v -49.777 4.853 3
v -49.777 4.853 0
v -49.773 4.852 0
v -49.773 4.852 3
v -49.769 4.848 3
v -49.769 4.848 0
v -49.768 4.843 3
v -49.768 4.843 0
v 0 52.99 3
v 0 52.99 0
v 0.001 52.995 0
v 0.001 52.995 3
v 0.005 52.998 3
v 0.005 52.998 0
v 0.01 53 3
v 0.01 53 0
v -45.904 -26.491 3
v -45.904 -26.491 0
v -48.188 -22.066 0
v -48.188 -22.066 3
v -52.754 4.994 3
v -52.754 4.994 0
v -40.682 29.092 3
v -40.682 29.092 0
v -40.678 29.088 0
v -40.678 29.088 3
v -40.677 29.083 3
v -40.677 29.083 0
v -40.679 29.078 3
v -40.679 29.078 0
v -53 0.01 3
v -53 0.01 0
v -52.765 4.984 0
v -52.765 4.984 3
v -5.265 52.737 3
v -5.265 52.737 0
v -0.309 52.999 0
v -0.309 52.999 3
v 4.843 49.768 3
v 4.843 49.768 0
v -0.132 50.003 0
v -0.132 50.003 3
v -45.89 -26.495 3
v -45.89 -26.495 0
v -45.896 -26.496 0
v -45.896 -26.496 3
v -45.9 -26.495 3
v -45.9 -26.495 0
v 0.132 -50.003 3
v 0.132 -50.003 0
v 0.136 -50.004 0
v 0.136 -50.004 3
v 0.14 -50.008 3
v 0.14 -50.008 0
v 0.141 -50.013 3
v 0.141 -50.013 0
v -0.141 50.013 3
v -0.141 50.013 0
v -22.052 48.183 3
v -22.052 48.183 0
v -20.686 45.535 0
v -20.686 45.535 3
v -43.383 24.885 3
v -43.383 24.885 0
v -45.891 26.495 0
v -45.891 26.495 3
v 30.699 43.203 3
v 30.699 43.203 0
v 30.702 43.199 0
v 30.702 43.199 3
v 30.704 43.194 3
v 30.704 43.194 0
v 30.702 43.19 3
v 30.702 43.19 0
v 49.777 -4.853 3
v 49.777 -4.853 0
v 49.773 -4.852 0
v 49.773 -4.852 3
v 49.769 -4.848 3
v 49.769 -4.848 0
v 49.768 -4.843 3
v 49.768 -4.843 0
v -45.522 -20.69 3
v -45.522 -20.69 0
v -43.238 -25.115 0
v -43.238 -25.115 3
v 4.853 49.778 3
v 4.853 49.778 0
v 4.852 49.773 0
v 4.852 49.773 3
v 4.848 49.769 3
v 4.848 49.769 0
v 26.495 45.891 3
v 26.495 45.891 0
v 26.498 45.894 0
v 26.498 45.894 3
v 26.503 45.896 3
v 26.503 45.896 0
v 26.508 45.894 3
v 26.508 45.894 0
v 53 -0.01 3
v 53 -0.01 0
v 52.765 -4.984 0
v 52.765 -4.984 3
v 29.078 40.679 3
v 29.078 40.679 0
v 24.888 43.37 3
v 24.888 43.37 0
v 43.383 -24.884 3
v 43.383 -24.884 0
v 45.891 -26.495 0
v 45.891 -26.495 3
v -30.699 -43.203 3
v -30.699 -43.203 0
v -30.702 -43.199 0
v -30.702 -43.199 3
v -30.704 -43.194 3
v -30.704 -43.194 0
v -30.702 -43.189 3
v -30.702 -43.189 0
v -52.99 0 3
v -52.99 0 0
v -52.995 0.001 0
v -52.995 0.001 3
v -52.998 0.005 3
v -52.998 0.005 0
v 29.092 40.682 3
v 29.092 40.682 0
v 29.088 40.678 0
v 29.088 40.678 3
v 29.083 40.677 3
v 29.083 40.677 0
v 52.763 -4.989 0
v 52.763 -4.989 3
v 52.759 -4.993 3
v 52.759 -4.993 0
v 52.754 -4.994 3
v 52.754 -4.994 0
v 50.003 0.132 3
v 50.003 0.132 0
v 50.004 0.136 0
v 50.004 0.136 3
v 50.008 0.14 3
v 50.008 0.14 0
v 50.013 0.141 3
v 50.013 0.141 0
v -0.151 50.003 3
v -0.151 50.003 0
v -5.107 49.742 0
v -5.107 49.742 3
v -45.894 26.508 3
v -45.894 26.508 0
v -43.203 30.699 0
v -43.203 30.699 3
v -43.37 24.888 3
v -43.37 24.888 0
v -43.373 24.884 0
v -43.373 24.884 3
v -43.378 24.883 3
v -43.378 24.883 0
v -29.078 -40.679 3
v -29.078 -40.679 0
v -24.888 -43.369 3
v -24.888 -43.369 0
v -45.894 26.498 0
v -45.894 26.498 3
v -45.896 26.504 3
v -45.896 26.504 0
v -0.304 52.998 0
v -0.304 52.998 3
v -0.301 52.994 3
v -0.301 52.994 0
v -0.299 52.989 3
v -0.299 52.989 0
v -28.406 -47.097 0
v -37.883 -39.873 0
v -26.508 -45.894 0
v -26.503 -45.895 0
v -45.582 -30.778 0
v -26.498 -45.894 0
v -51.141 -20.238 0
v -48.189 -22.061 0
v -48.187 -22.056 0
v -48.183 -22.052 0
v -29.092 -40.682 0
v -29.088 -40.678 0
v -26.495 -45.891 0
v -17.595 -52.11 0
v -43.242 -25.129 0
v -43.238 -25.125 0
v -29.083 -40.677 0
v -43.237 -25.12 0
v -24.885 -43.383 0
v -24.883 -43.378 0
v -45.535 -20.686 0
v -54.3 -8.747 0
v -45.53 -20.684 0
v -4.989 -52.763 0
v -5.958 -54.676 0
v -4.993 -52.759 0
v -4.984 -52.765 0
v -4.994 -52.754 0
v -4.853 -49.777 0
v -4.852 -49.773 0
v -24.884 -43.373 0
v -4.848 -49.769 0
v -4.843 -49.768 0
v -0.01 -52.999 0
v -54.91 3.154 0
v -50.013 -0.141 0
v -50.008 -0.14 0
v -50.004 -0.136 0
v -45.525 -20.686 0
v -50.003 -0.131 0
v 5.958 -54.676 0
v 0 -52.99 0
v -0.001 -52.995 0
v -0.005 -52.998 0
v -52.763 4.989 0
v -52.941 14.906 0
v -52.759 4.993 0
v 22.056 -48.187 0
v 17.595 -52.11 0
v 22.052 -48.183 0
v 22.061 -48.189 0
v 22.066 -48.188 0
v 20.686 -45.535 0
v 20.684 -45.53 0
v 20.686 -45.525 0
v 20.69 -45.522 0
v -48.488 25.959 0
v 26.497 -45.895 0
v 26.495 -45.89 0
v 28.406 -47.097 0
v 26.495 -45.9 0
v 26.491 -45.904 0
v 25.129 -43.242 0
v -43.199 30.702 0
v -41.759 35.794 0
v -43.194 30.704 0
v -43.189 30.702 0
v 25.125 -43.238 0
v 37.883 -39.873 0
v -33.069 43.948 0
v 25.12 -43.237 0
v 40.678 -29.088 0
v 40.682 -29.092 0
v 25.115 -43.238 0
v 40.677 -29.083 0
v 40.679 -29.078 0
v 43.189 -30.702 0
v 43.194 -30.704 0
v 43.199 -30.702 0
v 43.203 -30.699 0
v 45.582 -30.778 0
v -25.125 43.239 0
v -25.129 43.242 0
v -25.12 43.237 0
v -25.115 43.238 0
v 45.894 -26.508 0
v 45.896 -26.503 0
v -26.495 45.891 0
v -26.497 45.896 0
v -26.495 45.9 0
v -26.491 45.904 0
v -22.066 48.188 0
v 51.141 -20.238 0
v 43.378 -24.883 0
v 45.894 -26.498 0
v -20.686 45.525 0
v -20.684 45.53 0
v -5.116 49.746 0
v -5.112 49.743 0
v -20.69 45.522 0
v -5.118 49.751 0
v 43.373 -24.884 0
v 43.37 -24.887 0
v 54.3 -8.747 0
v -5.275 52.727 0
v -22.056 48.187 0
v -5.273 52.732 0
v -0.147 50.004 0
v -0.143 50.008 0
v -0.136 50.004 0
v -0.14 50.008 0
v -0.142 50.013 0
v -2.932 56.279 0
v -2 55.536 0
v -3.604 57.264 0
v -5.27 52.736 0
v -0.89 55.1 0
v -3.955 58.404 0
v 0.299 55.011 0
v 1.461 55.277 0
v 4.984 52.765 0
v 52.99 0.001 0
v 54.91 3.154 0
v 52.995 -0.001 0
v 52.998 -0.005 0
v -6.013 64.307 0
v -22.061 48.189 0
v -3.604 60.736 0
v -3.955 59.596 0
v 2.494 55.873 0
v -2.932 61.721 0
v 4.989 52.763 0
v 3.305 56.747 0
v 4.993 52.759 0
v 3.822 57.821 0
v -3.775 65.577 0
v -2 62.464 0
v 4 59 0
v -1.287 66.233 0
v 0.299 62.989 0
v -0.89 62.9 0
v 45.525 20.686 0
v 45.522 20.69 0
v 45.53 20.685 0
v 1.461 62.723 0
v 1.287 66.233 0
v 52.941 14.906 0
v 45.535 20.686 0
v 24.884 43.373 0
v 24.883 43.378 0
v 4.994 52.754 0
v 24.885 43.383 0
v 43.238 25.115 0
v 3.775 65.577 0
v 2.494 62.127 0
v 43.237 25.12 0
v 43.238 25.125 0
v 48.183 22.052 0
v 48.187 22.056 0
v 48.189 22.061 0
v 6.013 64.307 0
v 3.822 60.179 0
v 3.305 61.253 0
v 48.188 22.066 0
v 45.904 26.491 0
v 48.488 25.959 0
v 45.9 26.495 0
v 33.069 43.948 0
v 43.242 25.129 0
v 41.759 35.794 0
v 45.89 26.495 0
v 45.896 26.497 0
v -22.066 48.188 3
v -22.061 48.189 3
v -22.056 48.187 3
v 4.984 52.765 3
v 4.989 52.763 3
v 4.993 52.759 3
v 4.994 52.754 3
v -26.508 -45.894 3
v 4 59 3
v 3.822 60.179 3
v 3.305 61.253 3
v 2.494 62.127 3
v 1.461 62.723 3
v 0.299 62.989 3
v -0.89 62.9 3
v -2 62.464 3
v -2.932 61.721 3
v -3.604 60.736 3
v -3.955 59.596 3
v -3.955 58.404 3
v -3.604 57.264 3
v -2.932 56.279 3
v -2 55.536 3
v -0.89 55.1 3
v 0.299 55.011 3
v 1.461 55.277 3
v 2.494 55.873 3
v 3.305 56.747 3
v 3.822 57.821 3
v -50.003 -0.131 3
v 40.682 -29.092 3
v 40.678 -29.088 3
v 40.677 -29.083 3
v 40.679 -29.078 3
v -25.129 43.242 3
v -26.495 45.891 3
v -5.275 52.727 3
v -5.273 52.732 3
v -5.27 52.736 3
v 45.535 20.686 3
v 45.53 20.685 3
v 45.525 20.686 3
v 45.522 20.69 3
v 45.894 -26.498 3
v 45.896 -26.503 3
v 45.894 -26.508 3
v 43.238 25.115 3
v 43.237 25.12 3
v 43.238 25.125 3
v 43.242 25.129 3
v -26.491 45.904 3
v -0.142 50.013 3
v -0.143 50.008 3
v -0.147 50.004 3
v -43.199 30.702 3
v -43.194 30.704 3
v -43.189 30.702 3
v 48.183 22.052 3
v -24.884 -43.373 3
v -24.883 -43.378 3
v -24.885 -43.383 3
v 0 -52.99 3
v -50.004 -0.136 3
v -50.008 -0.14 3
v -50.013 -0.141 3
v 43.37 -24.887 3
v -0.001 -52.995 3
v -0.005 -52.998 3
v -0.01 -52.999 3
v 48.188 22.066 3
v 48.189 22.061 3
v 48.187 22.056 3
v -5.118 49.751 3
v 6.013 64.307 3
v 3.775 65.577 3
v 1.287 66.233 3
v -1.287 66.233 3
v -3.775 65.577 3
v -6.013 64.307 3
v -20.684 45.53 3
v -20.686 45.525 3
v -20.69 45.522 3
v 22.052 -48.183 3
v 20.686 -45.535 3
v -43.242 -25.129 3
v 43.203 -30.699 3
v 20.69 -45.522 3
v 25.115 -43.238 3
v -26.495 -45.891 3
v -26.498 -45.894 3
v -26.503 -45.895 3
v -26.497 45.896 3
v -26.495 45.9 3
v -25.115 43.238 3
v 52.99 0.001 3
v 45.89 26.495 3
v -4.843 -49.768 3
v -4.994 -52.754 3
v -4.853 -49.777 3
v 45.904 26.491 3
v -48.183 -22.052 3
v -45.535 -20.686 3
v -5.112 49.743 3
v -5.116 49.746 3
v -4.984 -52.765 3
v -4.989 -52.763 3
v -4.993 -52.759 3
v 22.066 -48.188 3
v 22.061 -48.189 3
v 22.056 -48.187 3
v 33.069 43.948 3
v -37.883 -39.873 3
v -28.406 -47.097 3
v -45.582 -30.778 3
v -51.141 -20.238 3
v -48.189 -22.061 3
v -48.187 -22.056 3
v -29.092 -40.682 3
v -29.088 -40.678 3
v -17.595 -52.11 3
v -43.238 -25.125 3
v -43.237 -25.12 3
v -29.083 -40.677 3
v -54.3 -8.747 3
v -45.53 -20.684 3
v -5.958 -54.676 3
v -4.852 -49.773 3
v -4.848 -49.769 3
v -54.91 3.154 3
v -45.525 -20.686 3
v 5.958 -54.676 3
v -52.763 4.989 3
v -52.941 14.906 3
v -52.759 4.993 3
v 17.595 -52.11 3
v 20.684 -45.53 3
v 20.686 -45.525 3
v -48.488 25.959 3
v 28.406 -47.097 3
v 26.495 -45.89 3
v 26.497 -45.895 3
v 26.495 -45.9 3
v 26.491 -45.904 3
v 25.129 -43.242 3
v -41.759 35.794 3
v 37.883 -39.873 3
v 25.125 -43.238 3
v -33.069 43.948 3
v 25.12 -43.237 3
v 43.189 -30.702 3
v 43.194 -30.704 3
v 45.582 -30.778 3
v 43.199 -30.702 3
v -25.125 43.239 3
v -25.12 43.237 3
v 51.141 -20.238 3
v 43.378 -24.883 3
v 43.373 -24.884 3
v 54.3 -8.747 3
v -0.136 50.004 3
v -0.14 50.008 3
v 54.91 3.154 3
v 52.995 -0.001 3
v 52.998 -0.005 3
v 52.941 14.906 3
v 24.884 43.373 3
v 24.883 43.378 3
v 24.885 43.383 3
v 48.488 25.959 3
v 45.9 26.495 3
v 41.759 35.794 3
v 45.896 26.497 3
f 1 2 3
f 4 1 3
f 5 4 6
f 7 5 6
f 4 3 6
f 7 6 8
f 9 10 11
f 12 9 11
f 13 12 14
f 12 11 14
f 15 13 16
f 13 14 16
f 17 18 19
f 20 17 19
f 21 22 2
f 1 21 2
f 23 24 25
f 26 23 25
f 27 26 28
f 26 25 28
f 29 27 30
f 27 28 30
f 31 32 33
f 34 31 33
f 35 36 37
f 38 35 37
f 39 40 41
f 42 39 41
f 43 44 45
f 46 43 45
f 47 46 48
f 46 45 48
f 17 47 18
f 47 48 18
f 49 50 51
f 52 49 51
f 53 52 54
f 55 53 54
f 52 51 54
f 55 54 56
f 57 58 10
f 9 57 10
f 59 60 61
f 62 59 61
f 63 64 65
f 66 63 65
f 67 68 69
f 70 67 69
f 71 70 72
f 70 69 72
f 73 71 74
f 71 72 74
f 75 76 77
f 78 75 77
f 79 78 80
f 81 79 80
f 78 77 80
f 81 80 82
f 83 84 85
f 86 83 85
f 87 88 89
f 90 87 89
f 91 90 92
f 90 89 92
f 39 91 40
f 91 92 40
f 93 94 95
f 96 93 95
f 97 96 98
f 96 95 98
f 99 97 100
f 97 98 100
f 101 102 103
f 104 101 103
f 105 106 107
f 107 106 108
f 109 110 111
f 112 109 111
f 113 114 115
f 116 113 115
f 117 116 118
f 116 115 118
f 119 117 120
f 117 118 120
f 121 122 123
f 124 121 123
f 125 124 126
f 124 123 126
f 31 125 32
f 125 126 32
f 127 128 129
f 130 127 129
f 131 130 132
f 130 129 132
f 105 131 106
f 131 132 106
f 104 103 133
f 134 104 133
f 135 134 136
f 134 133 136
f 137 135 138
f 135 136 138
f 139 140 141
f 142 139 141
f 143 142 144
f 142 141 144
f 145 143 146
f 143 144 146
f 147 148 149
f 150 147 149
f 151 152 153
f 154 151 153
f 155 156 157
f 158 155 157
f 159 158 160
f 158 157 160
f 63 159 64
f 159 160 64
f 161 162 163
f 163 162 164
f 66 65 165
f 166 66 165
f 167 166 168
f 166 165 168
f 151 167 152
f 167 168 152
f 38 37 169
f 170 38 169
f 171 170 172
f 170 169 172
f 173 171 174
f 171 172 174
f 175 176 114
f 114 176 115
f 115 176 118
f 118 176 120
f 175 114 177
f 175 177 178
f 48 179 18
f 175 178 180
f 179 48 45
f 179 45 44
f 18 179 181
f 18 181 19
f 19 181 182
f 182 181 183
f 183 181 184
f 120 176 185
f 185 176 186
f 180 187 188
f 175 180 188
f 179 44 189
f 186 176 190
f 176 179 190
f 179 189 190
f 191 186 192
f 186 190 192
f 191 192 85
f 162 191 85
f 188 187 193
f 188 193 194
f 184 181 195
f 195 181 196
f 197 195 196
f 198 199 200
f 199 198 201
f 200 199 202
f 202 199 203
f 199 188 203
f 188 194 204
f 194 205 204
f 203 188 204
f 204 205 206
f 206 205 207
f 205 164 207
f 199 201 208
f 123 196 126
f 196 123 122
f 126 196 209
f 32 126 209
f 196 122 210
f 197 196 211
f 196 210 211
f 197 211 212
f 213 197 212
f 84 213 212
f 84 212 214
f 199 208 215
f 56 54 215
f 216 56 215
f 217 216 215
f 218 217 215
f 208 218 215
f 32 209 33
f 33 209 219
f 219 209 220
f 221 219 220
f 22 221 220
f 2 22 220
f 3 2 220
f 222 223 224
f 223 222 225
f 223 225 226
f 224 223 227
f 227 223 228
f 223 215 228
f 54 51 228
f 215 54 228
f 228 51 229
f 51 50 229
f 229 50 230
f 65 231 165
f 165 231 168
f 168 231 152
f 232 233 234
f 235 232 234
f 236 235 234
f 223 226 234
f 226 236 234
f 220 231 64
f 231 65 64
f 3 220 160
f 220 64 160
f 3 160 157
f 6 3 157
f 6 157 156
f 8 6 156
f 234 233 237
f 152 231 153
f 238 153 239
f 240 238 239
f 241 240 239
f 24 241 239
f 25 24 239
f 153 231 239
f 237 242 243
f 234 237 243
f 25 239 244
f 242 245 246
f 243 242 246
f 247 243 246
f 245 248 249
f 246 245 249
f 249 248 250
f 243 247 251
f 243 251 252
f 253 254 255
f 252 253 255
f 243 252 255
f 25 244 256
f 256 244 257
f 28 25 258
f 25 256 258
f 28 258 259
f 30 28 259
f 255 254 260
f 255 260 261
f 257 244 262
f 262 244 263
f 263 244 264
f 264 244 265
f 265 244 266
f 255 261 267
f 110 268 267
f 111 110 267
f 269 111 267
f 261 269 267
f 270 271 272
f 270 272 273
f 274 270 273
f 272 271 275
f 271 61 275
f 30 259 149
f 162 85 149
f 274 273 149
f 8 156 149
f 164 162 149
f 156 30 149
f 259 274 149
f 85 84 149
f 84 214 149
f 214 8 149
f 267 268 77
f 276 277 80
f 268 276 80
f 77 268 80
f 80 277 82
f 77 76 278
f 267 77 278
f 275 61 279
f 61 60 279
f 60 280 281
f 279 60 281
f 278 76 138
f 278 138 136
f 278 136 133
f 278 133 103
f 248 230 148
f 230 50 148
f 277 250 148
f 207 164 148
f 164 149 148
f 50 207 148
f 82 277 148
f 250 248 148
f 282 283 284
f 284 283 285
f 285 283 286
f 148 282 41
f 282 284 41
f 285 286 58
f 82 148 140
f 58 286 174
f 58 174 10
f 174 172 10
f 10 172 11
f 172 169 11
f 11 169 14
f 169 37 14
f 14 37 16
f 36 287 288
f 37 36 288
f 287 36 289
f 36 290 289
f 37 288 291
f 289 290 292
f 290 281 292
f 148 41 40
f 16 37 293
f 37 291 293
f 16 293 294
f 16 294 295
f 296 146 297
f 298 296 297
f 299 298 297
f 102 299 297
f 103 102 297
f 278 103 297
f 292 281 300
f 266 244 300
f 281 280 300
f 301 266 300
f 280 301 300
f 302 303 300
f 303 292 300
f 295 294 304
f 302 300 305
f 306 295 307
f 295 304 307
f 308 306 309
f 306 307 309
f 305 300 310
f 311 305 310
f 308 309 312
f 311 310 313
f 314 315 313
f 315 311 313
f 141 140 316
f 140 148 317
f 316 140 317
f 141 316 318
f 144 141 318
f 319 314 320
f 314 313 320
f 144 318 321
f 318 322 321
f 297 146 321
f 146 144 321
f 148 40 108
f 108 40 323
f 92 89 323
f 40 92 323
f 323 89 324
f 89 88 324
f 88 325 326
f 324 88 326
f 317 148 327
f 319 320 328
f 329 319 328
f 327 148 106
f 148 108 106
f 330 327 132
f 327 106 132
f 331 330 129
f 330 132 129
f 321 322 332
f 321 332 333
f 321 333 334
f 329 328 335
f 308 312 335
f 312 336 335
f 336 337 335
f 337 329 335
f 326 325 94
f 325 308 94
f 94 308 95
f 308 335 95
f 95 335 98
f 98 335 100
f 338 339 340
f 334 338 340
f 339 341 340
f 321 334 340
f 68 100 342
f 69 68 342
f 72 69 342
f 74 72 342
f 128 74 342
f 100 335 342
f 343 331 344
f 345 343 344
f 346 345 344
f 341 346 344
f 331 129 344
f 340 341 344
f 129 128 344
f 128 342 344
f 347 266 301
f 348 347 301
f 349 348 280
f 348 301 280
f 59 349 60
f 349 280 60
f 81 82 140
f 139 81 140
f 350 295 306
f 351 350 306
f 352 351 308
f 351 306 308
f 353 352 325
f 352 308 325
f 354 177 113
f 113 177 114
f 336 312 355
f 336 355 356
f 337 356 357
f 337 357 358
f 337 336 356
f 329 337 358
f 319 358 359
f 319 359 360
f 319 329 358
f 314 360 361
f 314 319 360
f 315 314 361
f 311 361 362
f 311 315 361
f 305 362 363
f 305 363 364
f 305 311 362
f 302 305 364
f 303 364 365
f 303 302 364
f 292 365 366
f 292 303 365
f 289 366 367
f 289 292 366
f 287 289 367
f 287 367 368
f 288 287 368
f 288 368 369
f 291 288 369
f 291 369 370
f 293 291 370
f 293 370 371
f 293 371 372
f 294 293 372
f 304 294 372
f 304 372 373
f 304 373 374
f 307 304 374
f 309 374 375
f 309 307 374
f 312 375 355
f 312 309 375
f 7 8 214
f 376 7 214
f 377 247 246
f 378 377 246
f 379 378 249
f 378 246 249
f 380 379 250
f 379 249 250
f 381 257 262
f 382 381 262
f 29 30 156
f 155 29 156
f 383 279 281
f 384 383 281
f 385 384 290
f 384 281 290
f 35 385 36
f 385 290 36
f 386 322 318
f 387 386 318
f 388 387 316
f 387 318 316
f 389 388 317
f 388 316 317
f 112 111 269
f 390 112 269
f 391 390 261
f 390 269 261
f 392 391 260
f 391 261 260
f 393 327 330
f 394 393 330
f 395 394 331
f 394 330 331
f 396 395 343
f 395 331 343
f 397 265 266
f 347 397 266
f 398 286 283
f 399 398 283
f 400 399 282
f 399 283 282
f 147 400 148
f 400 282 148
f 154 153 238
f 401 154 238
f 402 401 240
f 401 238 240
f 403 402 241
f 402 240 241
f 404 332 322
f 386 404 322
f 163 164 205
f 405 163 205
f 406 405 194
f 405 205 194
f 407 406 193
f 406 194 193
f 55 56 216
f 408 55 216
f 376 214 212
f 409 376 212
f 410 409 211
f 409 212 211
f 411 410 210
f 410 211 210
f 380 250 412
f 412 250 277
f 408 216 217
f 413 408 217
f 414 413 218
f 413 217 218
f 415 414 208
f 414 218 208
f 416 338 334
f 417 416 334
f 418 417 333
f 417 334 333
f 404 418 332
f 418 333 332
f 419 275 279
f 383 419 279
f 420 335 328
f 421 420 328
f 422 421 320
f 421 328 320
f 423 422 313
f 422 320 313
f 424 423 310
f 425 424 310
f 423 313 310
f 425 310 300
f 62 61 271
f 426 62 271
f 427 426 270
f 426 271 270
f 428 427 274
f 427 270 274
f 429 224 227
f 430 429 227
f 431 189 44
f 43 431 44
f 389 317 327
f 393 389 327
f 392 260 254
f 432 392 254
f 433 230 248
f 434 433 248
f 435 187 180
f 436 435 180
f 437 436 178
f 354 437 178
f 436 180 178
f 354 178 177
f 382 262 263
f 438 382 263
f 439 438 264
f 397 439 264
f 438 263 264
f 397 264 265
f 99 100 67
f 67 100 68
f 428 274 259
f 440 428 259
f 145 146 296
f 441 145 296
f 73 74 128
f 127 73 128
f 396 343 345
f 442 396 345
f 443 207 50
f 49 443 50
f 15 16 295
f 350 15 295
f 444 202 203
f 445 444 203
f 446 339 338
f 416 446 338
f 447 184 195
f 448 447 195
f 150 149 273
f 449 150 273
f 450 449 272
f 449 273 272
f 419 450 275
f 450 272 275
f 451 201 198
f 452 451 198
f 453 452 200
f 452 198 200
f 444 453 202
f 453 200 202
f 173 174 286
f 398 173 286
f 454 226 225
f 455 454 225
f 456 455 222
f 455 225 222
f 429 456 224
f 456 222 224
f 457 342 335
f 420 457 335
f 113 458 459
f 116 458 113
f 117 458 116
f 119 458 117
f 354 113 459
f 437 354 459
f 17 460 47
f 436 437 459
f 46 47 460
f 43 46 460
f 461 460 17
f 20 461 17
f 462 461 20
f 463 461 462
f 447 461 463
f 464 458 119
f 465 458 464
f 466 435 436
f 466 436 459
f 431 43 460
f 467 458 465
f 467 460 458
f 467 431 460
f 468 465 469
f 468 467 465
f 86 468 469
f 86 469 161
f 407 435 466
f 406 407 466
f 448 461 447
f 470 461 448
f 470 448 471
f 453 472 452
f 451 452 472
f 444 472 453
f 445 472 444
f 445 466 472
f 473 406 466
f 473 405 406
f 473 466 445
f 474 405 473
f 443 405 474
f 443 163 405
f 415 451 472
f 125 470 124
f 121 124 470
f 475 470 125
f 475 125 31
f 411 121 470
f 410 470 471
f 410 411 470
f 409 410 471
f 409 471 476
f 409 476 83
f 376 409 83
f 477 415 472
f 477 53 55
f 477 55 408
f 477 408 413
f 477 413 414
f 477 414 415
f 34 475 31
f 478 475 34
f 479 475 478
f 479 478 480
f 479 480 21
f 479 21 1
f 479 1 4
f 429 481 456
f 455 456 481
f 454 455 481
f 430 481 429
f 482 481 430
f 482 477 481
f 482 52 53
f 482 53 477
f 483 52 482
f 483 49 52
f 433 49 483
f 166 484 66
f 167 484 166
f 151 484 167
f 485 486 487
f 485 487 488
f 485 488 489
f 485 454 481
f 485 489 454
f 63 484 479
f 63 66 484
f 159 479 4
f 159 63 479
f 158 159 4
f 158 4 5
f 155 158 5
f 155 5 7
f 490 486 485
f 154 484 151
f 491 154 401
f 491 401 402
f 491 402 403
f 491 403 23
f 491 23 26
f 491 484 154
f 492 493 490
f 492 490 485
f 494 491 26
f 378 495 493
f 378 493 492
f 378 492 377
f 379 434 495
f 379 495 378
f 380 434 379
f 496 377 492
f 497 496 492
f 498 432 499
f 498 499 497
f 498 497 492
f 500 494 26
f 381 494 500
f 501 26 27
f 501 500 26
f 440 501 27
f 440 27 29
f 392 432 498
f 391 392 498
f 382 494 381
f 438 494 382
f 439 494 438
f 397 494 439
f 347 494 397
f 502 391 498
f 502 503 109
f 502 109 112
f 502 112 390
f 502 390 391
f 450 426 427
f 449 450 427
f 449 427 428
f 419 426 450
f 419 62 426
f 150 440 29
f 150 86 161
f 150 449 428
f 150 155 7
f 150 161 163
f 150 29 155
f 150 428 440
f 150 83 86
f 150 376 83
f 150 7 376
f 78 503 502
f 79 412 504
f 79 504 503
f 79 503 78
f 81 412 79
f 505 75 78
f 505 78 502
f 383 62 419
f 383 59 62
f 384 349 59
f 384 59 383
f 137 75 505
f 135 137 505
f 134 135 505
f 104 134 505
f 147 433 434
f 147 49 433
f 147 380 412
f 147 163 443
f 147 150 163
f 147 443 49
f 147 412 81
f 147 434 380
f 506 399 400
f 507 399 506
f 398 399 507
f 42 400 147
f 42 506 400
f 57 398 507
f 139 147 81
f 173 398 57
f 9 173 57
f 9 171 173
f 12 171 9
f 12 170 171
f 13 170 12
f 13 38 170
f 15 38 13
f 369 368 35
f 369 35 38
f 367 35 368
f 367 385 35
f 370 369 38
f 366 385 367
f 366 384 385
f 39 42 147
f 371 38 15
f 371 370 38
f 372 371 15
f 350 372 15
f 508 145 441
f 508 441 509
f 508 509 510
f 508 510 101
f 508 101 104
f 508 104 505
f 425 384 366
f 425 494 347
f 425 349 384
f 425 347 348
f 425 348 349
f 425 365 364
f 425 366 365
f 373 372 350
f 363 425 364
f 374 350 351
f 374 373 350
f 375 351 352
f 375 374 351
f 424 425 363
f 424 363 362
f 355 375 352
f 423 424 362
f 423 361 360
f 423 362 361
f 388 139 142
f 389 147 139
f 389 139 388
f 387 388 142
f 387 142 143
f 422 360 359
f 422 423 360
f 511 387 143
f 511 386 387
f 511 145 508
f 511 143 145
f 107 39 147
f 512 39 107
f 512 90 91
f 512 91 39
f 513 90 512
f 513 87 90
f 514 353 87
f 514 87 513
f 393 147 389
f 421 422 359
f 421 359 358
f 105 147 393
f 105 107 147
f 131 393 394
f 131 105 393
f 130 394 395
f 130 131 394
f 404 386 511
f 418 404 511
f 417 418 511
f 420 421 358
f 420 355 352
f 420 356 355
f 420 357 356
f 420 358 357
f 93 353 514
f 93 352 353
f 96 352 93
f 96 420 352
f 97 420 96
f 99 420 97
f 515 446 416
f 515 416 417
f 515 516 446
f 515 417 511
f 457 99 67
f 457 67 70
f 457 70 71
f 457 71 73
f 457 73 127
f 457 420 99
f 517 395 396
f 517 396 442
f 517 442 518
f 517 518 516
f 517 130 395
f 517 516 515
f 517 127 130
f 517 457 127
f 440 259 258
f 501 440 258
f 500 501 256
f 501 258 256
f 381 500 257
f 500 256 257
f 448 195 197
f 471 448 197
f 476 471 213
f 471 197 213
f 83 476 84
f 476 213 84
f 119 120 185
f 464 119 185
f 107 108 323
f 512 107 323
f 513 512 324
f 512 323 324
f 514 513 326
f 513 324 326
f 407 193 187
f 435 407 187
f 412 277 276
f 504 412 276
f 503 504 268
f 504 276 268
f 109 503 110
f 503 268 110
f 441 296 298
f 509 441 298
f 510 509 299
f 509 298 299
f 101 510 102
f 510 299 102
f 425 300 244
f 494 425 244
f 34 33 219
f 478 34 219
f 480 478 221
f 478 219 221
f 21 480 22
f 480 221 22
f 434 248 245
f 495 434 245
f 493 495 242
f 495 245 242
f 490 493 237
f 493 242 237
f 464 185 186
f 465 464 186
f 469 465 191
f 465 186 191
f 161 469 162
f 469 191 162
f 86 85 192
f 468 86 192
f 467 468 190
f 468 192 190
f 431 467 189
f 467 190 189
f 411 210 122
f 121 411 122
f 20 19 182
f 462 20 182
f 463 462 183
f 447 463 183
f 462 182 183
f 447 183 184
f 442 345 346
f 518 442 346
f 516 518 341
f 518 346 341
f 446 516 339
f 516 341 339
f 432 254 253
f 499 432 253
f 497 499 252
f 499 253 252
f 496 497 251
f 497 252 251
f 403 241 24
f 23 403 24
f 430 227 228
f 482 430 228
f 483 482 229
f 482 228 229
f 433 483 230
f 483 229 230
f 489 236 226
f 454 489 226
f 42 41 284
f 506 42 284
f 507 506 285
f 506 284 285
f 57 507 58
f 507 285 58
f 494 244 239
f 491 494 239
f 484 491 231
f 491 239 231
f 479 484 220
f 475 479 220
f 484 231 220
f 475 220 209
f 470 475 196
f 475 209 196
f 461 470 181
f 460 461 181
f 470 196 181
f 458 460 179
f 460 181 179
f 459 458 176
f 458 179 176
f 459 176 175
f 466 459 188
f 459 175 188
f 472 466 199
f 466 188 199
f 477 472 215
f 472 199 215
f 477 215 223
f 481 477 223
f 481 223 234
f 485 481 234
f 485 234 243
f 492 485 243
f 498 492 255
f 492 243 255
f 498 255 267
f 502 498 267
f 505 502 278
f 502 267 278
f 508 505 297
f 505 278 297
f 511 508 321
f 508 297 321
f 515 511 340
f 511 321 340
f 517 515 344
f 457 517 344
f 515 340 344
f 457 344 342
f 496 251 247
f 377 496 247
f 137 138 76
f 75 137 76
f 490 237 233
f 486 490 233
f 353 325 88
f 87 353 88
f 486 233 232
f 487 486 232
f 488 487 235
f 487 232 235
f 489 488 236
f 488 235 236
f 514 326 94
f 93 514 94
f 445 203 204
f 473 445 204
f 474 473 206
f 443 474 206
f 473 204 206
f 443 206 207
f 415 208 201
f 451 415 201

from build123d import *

# Parameters (mm, degrees)
SKETCH1_R           = 4
BOSS_EXTRUDE2_DEPTH = 3


with BuildPart() as part:
    # Sketch1 → Boss-Extrude2 (new body)
    with BuildSketch(Plane.XY):
        with BuildLine():
            Line((-6.012571554, 64.307027075), (-33.069131887, 43.948066126))
            ThreePointArc((-33.069131887, 43.948066126), (2.07e-06, -55), (33.069128578, 43.948068616))
            Line((33.069128578, 43.948068616), (6.012566712, 64.307027528))
            ThreePointArc((6.012566712, 64.307027528), (-2.497e-06, 66.316469598), (-6.012571554, 64.307027075))
        make_face()
        with BuildLine():
            ThreePointArc((-30.698965133, -43.203238849), (-30.703332787, -43.196953768), (-30.701976961, -43.189421147))
            Line((-30.701976961, -43.189421147), (-29.091901743, -40.68182114))
            ThreePointArc((-29.091901743, -40.68182114), (-29.085616662, -40.677453486), (-29.078084041, -40.678809312))
            Line((-29.078084041, -40.678809312), (-24.88753101, -43.369471925))
            ThreePointArc((-24.88753101, -43.369471925), (-24.883163356, -43.375757006), (-24.884519182, -43.383289627))
            Line((-24.884519182, -43.383289627), (-26.4945944, -45.890889633))
            ThreePointArc((-26.4945944, -45.890889633), (-26.500879481, -45.895257287), (-26.508412102, -45.893901462))
            Line((-26.508412102, -45.893901462), (-30.698965133, -43.203238849))
        make_face(mode=Mode.SUBTRACT)
        with BuildLine():
            ThreePointArc((-4.98444277, -52.764580253), (-4.99136781, -52.76132104), (-4.993959941, -52.754119686))
            Line((-4.993959941, -52.754119686), (-4.853393903, -49.777436769))
            ThreePointArc((-4.853393903, -49.777436769), (-4.85013469, -49.770511729), (-4.842933336, -49.767919598))
            Line((-4.842933336, -49.767919598), (0.131523351, -50.002825259))
            ThreePointArc((0.131523351, -50.002825259), (0.138448391, -50.006084472), (0.141040522, -50.013285826))
            Line((0.141040522, -50.013285826), (0.000474484, -52.989968743))
            ThreePointArc((0.000474484, -52.989968743), (-0.002784729, -52.996893783), (-0.009986083, -52.999485914))
            Line((-0.009986083, -52.999485914), (-4.98444277, -52.764580253))
        make_face(mode=Mode.SUBTRACT)
        with BuildLine():
            ThreePointArc((-48.187724044, -22.065613117), (-48.188364003, -22.05798625), (-48.183423512, -22.052140721))
            Line((-48.183423512, -22.052140721), (-45.535257468, -20.685533022))
            ThreePointArc((-45.535257468, -20.685533022), (-45.527630602, -20.684893064), (-45.521785073, -20.689833554))
            Line((-45.521785073, -20.689833554), (-43.237990999, -25.115292245))
            ThreePointArc((-43.237990999, -25.115292245), (-43.23735104, -25.122919112), (-43.242291531, -25.12876464))
            Line((-43.242291531, -25.12876464), (-45.890457575, -26.495372339))
            ThreePointArc((-45.890457575, -26.495372339), (-45.898084441, -26.496012298), (-45.90392997, -26.491071808))
            Line((-45.90392997, -26.491071808), (-48.187724044, -22.065613117))
        make_face(mode=Mode.SUBTRACT)
        with BuildLine():
            ThreePointArc((-52.764620675, 4.984487199), (-52.761361462, 4.991412238), (-52.754160108, 4.994004369))
            Line((-52.754160108, 4.994004369), (-49.777477191, 4.853438332))
            ThreePointArc((-49.777477191, 4.853438332), (-49.770552151, 4.850179119), (-49.76796002, 4.842977765))
            Line((-49.76796002, 4.842977765), (-50.002865681, -0.131478922))
            ThreePointArc((-50.002865681, -0.131478922), (-50.006124893, -0.138403962), (-50.013326248, -0.140996093))
            Line((-50.013326248, -0.140996093), (-52.990009165, -0.000430055))
            ThreePointArc((-52.990009165, -0.000430055), (-52.996934204, 0.002829158), (-52.999526335, 0.010030512))
            Line((-52.999526335, 0.010030512), (-52.764620675, 4.984487199))
        make_face(mode=Mode.SUBTRACT)
        with BuildLine():
            ThreePointArc((22.065657545, -48.187683622), (22.058030679, -48.188323581), (22.05218515, -48.183383091))
            Line((22.05218515, -48.183383091), (20.685577451, -45.535217046))
            ThreePointArc((20.685577451, -45.535217046), (20.684937492, -45.52759018), (20.689877983, -45.521744651))
            Line((20.689877983, -45.521744651), (25.115336674, -43.237950577))
            ThreePointArc((25.115336674, -43.237950577), (25.12296354, -43.237310619), (25.128809069, -43.242251109))
            Line((25.128809069, -43.242251109), (26.495416768, -45.890417153))
            ThreePointArc((26.495416768, -45.890417153), (26.496056726, -45.898044019), (26.491116236, -45.903889548))
            Line((26.491116236, -45.903889548), (22.065657545, -48.187683622))
        make_face(mode=Mode.SUBTRACT)
        with BuildLine():
            ThreePointArc((43.203283277, -30.698924711), (43.196998196, -30.703292365), (43.189465575, -30.701936539))
            Line((43.189465575, -30.701936539), (40.681865569, -29.091861321))
            ThreePointArc((40.681865569, -29.091861321), (40.677497915, -29.08557624), (40.678853741, -29.078043619))
            Line((40.678853741, -29.078043619), (43.369516354, -24.887490588))
            ThreePointArc((43.369516354, -24.887490588), (43.375801435, -24.883122935), (43.383334056, -24.88447876))
            Line((43.383334056, -24.88447876), (45.890934062, -26.494553978))
            ThreePointArc((45.890934062, -26.494553978), (45.895301716, -26.500839059), (45.89394589, -26.508371681))
            Line((45.89394589, -26.508371681), (43.203283277, -30.698924711))
        make_face(mode=Mode.SUBTRACT)
        with BuildLine():
            ThreePointArc((52.990013172, 0.000514906), (52.996938211, -0.002744307), (52.999530342, -0.009945661))
            Line((52.999530342, -0.009945661), (52.764624682, -4.984402348))
            ThreePointArc((52.764624682, -4.984402348), (52.761365469, -4.991327388), (52.754164115, -4.993919519))
            Line((52.754164115, -4.993919519), (49.777481198, -4.853353481))
            ThreePointArc((49.777481198, -4.853353481), (49.770556158, -4.850094268), (49.767964027, -4.842892914))
            Line((49.767964027, -4.842892914), (50.002869687, 0.131563773))
            ThreePointArc((50.002869687, 0.131563773), (50.0061289, 0.138488813), (50.013330254, 0.141080944))
            Line((50.013330254, 0.141080944), (52.990013172, 0.000514906))
        make_face(mode=Mode.SUBTRACT)
        with BuildLine():
            ThreePointArc((-43.203279271, 30.699009562), (-43.19699419, 30.703377216), (-43.189461569, 30.70202139))
            Line((-43.189461569, 30.70202139), (-40.681861562, 29.091946172))
            ThreePointArc((-40.681861562, 29.091946172), (-40.677493908, 29.085661091), (-40.678849734, 29.07812847))
            Line((-40.678849734, 29.07812847), (-43.369512347, 24.887575439))
            ThreePointArc((-43.369512347, 24.887575439), (-43.375797428, 24.883207785), (-43.383330049, 24.884563611))
            Line((-43.383330049, 24.884563611), (-45.890930055, 26.494638829))
            ThreePointArc((-45.890930055, 26.494638829), (-45.895297709, 26.50092391), (-45.893941883, 26.508456531))
            Line((-45.893941883, 26.508456531), (-43.203279271, 30.699009562))
        make_face(mode=Mode.SUBTRACT)
        with BuildLine():
            ThreePointArc((-22.065653538, 48.187768473), (-22.058026672, 48.188408431), (-22.052181143, 48.183467941))
            Line((-22.052181143, 48.183467941), (-20.685573444, 45.535301897))
            ThreePointArc((-20.685573444, 45.535301897), (-20.684933486, 45.52767503), (-20.689873976, 45.521829502))
            Line((-20.689873976, 45.521829502), (-25.115332667, 43.238035428))
            ThreePointArc((-25.115332667, 43.238035428), (-25.122959534, 43.237395469), (-25.128805062, 43.242335959))
            Line((-25.128805062, 43.242335959), (-26.495412761, 45.890502003))
            ThreePointArc((-26.495412761, 45.890502003), (-26.49605272, 45.89812887), (-26.49111223, 45.903974398))
            Line((-26.49111223, 45.903974398), (-22.065653538, 48.187768473))
        make_face(mode=Mode.SUBTRACT)
        with BuildLine():
            ThreePointArc((-0.309437301, 52.998669808), (-0.302221838, 52.996117213), (-0.298924693, 52.989210153))
            Line((-0.298924693, 52.989210153), (-0.14203469, 50.013342964))
            ThreePointArc((-0.14203469, 50.013342964), (-0.144587285, 50.006127501), (-0.151494345, 50.002830356))
            Line((-0.151494345, 50.002830356), (-5.10710915, 49.741566538))
            ThreePointArc((-5.10710915, 49.741566538), (-5.114324612, 49.744119133), (-5.117621758, 49.751026193))
            Line((-5.117621758, 49.751026193), (-5.274511761, 52.726893382))
            ThreePointArc((-5.274511761, 52.726893382), (-5.271959166, 52.734108845), (-5.265052106, 52.73740599))
            Line((-5.265052106, 52.73740599), (-0.309437301, 52.998669808))
        make_face(mode=Mode.SUBTRACT)
        with Locations((0, 59)):
            Circle(SKETCH1_R, mode=Mode.SUBTRACT)
        with BuildLine():
            ThreePointArc((48.187728051, 22.065697967), (48.188368009, 22.0580711), (48.183427519, 22.052225572))
            Line((48.183427519, 22.052225572), (45.535261475, 20.685617873))
            ThreePointArc((45.535261475, 20.685617873), (45.527634608, 20.684977914), (45.52178908, 20.689918404))
            Line((45.52178908, 20.689918404), (43.237995006, 25.115377096))
            ThreePointArc((43.237995006, 25.115377096), (43.237355047, 25.123003962), (43.242295537, 25.128849491))
            Line((43.242295537, 25.128849491), (45.890461581, 26.49545719))
            ThreePointArc((45.890461581, 26.49545719), (45.898088448, 26.496097148), (45.903933977, 26.491156658))
            Line((45.903933977, 26.491156658), (48.187728051, 22.065697967))
        make_face(mode=Mode.SUBTRACT)
        with BuildLine():
            ThreePointArc((4.984446777, 52.764665104), (4.991371816, 52.761405891), (4.993963947, 52.754204537))
            Line((4.993963947, 52.754204537), (4.85339791, 49.77752162))
            ThreePointArc((4.85339791, 49.77752162), (4.850138697, 49.77059658), (4.842937343, 49.768004449))
            Line((4.842937343, 49.768004449), (-0.131519344, 50.002910109))
            ThreePointArc((-0.131519344, 50.002910109), (-0.138444384, 50.006169322), (-0.141036515, 50.013370676))
            Line((-0.141036515, 50.013370676), (-0.000470477, 52.990053593))
            ThreePointArc((-0.000470477, 52.990053593), (0.002788736, 52.996978633), (0.00999009, 52.999570764))
            Line((0.00999009, 52.999570764), (4.984446777, 52.764665104))
        make_face(mode=Mode.SUBTRACT)
        with BuildLine():
            ThreePointArc((30.69896914, 43.203323699), (30.703336794, 43.197038618), (30.701980968, 43.189505997))
            Line((30.701980968, 43.189505997), (29.09190575, 40.681905991))
            ThreePointArc((29.09190575, 40.681905991), (29.085620669, 40.677538337), (29.078088048, 40.678894163))
            Line((29.078088048, 40.678894163), (24.887535017, 43.369556776))
            ThreePointArc((24.887535017, 43.369556776), (24.883167363, 43.375841857), (24.884523189, 43.383374478))
            Line((24.884523189, 43.383374478), (26.494598407, 45.890974484))
            ThreePointArc((26.494598407, 45.890974484), (26.500883488, 45.895342138), (26.508416109, 45.893986312))
            Line((26.508416109, 45.893986312), (30.69896914, 43.203323699))
        make_face(mode=Mode.SUBTRACT)
    extrude(amount=BOSS_EXTRUDE2_DEPTH)


solid = part.part
